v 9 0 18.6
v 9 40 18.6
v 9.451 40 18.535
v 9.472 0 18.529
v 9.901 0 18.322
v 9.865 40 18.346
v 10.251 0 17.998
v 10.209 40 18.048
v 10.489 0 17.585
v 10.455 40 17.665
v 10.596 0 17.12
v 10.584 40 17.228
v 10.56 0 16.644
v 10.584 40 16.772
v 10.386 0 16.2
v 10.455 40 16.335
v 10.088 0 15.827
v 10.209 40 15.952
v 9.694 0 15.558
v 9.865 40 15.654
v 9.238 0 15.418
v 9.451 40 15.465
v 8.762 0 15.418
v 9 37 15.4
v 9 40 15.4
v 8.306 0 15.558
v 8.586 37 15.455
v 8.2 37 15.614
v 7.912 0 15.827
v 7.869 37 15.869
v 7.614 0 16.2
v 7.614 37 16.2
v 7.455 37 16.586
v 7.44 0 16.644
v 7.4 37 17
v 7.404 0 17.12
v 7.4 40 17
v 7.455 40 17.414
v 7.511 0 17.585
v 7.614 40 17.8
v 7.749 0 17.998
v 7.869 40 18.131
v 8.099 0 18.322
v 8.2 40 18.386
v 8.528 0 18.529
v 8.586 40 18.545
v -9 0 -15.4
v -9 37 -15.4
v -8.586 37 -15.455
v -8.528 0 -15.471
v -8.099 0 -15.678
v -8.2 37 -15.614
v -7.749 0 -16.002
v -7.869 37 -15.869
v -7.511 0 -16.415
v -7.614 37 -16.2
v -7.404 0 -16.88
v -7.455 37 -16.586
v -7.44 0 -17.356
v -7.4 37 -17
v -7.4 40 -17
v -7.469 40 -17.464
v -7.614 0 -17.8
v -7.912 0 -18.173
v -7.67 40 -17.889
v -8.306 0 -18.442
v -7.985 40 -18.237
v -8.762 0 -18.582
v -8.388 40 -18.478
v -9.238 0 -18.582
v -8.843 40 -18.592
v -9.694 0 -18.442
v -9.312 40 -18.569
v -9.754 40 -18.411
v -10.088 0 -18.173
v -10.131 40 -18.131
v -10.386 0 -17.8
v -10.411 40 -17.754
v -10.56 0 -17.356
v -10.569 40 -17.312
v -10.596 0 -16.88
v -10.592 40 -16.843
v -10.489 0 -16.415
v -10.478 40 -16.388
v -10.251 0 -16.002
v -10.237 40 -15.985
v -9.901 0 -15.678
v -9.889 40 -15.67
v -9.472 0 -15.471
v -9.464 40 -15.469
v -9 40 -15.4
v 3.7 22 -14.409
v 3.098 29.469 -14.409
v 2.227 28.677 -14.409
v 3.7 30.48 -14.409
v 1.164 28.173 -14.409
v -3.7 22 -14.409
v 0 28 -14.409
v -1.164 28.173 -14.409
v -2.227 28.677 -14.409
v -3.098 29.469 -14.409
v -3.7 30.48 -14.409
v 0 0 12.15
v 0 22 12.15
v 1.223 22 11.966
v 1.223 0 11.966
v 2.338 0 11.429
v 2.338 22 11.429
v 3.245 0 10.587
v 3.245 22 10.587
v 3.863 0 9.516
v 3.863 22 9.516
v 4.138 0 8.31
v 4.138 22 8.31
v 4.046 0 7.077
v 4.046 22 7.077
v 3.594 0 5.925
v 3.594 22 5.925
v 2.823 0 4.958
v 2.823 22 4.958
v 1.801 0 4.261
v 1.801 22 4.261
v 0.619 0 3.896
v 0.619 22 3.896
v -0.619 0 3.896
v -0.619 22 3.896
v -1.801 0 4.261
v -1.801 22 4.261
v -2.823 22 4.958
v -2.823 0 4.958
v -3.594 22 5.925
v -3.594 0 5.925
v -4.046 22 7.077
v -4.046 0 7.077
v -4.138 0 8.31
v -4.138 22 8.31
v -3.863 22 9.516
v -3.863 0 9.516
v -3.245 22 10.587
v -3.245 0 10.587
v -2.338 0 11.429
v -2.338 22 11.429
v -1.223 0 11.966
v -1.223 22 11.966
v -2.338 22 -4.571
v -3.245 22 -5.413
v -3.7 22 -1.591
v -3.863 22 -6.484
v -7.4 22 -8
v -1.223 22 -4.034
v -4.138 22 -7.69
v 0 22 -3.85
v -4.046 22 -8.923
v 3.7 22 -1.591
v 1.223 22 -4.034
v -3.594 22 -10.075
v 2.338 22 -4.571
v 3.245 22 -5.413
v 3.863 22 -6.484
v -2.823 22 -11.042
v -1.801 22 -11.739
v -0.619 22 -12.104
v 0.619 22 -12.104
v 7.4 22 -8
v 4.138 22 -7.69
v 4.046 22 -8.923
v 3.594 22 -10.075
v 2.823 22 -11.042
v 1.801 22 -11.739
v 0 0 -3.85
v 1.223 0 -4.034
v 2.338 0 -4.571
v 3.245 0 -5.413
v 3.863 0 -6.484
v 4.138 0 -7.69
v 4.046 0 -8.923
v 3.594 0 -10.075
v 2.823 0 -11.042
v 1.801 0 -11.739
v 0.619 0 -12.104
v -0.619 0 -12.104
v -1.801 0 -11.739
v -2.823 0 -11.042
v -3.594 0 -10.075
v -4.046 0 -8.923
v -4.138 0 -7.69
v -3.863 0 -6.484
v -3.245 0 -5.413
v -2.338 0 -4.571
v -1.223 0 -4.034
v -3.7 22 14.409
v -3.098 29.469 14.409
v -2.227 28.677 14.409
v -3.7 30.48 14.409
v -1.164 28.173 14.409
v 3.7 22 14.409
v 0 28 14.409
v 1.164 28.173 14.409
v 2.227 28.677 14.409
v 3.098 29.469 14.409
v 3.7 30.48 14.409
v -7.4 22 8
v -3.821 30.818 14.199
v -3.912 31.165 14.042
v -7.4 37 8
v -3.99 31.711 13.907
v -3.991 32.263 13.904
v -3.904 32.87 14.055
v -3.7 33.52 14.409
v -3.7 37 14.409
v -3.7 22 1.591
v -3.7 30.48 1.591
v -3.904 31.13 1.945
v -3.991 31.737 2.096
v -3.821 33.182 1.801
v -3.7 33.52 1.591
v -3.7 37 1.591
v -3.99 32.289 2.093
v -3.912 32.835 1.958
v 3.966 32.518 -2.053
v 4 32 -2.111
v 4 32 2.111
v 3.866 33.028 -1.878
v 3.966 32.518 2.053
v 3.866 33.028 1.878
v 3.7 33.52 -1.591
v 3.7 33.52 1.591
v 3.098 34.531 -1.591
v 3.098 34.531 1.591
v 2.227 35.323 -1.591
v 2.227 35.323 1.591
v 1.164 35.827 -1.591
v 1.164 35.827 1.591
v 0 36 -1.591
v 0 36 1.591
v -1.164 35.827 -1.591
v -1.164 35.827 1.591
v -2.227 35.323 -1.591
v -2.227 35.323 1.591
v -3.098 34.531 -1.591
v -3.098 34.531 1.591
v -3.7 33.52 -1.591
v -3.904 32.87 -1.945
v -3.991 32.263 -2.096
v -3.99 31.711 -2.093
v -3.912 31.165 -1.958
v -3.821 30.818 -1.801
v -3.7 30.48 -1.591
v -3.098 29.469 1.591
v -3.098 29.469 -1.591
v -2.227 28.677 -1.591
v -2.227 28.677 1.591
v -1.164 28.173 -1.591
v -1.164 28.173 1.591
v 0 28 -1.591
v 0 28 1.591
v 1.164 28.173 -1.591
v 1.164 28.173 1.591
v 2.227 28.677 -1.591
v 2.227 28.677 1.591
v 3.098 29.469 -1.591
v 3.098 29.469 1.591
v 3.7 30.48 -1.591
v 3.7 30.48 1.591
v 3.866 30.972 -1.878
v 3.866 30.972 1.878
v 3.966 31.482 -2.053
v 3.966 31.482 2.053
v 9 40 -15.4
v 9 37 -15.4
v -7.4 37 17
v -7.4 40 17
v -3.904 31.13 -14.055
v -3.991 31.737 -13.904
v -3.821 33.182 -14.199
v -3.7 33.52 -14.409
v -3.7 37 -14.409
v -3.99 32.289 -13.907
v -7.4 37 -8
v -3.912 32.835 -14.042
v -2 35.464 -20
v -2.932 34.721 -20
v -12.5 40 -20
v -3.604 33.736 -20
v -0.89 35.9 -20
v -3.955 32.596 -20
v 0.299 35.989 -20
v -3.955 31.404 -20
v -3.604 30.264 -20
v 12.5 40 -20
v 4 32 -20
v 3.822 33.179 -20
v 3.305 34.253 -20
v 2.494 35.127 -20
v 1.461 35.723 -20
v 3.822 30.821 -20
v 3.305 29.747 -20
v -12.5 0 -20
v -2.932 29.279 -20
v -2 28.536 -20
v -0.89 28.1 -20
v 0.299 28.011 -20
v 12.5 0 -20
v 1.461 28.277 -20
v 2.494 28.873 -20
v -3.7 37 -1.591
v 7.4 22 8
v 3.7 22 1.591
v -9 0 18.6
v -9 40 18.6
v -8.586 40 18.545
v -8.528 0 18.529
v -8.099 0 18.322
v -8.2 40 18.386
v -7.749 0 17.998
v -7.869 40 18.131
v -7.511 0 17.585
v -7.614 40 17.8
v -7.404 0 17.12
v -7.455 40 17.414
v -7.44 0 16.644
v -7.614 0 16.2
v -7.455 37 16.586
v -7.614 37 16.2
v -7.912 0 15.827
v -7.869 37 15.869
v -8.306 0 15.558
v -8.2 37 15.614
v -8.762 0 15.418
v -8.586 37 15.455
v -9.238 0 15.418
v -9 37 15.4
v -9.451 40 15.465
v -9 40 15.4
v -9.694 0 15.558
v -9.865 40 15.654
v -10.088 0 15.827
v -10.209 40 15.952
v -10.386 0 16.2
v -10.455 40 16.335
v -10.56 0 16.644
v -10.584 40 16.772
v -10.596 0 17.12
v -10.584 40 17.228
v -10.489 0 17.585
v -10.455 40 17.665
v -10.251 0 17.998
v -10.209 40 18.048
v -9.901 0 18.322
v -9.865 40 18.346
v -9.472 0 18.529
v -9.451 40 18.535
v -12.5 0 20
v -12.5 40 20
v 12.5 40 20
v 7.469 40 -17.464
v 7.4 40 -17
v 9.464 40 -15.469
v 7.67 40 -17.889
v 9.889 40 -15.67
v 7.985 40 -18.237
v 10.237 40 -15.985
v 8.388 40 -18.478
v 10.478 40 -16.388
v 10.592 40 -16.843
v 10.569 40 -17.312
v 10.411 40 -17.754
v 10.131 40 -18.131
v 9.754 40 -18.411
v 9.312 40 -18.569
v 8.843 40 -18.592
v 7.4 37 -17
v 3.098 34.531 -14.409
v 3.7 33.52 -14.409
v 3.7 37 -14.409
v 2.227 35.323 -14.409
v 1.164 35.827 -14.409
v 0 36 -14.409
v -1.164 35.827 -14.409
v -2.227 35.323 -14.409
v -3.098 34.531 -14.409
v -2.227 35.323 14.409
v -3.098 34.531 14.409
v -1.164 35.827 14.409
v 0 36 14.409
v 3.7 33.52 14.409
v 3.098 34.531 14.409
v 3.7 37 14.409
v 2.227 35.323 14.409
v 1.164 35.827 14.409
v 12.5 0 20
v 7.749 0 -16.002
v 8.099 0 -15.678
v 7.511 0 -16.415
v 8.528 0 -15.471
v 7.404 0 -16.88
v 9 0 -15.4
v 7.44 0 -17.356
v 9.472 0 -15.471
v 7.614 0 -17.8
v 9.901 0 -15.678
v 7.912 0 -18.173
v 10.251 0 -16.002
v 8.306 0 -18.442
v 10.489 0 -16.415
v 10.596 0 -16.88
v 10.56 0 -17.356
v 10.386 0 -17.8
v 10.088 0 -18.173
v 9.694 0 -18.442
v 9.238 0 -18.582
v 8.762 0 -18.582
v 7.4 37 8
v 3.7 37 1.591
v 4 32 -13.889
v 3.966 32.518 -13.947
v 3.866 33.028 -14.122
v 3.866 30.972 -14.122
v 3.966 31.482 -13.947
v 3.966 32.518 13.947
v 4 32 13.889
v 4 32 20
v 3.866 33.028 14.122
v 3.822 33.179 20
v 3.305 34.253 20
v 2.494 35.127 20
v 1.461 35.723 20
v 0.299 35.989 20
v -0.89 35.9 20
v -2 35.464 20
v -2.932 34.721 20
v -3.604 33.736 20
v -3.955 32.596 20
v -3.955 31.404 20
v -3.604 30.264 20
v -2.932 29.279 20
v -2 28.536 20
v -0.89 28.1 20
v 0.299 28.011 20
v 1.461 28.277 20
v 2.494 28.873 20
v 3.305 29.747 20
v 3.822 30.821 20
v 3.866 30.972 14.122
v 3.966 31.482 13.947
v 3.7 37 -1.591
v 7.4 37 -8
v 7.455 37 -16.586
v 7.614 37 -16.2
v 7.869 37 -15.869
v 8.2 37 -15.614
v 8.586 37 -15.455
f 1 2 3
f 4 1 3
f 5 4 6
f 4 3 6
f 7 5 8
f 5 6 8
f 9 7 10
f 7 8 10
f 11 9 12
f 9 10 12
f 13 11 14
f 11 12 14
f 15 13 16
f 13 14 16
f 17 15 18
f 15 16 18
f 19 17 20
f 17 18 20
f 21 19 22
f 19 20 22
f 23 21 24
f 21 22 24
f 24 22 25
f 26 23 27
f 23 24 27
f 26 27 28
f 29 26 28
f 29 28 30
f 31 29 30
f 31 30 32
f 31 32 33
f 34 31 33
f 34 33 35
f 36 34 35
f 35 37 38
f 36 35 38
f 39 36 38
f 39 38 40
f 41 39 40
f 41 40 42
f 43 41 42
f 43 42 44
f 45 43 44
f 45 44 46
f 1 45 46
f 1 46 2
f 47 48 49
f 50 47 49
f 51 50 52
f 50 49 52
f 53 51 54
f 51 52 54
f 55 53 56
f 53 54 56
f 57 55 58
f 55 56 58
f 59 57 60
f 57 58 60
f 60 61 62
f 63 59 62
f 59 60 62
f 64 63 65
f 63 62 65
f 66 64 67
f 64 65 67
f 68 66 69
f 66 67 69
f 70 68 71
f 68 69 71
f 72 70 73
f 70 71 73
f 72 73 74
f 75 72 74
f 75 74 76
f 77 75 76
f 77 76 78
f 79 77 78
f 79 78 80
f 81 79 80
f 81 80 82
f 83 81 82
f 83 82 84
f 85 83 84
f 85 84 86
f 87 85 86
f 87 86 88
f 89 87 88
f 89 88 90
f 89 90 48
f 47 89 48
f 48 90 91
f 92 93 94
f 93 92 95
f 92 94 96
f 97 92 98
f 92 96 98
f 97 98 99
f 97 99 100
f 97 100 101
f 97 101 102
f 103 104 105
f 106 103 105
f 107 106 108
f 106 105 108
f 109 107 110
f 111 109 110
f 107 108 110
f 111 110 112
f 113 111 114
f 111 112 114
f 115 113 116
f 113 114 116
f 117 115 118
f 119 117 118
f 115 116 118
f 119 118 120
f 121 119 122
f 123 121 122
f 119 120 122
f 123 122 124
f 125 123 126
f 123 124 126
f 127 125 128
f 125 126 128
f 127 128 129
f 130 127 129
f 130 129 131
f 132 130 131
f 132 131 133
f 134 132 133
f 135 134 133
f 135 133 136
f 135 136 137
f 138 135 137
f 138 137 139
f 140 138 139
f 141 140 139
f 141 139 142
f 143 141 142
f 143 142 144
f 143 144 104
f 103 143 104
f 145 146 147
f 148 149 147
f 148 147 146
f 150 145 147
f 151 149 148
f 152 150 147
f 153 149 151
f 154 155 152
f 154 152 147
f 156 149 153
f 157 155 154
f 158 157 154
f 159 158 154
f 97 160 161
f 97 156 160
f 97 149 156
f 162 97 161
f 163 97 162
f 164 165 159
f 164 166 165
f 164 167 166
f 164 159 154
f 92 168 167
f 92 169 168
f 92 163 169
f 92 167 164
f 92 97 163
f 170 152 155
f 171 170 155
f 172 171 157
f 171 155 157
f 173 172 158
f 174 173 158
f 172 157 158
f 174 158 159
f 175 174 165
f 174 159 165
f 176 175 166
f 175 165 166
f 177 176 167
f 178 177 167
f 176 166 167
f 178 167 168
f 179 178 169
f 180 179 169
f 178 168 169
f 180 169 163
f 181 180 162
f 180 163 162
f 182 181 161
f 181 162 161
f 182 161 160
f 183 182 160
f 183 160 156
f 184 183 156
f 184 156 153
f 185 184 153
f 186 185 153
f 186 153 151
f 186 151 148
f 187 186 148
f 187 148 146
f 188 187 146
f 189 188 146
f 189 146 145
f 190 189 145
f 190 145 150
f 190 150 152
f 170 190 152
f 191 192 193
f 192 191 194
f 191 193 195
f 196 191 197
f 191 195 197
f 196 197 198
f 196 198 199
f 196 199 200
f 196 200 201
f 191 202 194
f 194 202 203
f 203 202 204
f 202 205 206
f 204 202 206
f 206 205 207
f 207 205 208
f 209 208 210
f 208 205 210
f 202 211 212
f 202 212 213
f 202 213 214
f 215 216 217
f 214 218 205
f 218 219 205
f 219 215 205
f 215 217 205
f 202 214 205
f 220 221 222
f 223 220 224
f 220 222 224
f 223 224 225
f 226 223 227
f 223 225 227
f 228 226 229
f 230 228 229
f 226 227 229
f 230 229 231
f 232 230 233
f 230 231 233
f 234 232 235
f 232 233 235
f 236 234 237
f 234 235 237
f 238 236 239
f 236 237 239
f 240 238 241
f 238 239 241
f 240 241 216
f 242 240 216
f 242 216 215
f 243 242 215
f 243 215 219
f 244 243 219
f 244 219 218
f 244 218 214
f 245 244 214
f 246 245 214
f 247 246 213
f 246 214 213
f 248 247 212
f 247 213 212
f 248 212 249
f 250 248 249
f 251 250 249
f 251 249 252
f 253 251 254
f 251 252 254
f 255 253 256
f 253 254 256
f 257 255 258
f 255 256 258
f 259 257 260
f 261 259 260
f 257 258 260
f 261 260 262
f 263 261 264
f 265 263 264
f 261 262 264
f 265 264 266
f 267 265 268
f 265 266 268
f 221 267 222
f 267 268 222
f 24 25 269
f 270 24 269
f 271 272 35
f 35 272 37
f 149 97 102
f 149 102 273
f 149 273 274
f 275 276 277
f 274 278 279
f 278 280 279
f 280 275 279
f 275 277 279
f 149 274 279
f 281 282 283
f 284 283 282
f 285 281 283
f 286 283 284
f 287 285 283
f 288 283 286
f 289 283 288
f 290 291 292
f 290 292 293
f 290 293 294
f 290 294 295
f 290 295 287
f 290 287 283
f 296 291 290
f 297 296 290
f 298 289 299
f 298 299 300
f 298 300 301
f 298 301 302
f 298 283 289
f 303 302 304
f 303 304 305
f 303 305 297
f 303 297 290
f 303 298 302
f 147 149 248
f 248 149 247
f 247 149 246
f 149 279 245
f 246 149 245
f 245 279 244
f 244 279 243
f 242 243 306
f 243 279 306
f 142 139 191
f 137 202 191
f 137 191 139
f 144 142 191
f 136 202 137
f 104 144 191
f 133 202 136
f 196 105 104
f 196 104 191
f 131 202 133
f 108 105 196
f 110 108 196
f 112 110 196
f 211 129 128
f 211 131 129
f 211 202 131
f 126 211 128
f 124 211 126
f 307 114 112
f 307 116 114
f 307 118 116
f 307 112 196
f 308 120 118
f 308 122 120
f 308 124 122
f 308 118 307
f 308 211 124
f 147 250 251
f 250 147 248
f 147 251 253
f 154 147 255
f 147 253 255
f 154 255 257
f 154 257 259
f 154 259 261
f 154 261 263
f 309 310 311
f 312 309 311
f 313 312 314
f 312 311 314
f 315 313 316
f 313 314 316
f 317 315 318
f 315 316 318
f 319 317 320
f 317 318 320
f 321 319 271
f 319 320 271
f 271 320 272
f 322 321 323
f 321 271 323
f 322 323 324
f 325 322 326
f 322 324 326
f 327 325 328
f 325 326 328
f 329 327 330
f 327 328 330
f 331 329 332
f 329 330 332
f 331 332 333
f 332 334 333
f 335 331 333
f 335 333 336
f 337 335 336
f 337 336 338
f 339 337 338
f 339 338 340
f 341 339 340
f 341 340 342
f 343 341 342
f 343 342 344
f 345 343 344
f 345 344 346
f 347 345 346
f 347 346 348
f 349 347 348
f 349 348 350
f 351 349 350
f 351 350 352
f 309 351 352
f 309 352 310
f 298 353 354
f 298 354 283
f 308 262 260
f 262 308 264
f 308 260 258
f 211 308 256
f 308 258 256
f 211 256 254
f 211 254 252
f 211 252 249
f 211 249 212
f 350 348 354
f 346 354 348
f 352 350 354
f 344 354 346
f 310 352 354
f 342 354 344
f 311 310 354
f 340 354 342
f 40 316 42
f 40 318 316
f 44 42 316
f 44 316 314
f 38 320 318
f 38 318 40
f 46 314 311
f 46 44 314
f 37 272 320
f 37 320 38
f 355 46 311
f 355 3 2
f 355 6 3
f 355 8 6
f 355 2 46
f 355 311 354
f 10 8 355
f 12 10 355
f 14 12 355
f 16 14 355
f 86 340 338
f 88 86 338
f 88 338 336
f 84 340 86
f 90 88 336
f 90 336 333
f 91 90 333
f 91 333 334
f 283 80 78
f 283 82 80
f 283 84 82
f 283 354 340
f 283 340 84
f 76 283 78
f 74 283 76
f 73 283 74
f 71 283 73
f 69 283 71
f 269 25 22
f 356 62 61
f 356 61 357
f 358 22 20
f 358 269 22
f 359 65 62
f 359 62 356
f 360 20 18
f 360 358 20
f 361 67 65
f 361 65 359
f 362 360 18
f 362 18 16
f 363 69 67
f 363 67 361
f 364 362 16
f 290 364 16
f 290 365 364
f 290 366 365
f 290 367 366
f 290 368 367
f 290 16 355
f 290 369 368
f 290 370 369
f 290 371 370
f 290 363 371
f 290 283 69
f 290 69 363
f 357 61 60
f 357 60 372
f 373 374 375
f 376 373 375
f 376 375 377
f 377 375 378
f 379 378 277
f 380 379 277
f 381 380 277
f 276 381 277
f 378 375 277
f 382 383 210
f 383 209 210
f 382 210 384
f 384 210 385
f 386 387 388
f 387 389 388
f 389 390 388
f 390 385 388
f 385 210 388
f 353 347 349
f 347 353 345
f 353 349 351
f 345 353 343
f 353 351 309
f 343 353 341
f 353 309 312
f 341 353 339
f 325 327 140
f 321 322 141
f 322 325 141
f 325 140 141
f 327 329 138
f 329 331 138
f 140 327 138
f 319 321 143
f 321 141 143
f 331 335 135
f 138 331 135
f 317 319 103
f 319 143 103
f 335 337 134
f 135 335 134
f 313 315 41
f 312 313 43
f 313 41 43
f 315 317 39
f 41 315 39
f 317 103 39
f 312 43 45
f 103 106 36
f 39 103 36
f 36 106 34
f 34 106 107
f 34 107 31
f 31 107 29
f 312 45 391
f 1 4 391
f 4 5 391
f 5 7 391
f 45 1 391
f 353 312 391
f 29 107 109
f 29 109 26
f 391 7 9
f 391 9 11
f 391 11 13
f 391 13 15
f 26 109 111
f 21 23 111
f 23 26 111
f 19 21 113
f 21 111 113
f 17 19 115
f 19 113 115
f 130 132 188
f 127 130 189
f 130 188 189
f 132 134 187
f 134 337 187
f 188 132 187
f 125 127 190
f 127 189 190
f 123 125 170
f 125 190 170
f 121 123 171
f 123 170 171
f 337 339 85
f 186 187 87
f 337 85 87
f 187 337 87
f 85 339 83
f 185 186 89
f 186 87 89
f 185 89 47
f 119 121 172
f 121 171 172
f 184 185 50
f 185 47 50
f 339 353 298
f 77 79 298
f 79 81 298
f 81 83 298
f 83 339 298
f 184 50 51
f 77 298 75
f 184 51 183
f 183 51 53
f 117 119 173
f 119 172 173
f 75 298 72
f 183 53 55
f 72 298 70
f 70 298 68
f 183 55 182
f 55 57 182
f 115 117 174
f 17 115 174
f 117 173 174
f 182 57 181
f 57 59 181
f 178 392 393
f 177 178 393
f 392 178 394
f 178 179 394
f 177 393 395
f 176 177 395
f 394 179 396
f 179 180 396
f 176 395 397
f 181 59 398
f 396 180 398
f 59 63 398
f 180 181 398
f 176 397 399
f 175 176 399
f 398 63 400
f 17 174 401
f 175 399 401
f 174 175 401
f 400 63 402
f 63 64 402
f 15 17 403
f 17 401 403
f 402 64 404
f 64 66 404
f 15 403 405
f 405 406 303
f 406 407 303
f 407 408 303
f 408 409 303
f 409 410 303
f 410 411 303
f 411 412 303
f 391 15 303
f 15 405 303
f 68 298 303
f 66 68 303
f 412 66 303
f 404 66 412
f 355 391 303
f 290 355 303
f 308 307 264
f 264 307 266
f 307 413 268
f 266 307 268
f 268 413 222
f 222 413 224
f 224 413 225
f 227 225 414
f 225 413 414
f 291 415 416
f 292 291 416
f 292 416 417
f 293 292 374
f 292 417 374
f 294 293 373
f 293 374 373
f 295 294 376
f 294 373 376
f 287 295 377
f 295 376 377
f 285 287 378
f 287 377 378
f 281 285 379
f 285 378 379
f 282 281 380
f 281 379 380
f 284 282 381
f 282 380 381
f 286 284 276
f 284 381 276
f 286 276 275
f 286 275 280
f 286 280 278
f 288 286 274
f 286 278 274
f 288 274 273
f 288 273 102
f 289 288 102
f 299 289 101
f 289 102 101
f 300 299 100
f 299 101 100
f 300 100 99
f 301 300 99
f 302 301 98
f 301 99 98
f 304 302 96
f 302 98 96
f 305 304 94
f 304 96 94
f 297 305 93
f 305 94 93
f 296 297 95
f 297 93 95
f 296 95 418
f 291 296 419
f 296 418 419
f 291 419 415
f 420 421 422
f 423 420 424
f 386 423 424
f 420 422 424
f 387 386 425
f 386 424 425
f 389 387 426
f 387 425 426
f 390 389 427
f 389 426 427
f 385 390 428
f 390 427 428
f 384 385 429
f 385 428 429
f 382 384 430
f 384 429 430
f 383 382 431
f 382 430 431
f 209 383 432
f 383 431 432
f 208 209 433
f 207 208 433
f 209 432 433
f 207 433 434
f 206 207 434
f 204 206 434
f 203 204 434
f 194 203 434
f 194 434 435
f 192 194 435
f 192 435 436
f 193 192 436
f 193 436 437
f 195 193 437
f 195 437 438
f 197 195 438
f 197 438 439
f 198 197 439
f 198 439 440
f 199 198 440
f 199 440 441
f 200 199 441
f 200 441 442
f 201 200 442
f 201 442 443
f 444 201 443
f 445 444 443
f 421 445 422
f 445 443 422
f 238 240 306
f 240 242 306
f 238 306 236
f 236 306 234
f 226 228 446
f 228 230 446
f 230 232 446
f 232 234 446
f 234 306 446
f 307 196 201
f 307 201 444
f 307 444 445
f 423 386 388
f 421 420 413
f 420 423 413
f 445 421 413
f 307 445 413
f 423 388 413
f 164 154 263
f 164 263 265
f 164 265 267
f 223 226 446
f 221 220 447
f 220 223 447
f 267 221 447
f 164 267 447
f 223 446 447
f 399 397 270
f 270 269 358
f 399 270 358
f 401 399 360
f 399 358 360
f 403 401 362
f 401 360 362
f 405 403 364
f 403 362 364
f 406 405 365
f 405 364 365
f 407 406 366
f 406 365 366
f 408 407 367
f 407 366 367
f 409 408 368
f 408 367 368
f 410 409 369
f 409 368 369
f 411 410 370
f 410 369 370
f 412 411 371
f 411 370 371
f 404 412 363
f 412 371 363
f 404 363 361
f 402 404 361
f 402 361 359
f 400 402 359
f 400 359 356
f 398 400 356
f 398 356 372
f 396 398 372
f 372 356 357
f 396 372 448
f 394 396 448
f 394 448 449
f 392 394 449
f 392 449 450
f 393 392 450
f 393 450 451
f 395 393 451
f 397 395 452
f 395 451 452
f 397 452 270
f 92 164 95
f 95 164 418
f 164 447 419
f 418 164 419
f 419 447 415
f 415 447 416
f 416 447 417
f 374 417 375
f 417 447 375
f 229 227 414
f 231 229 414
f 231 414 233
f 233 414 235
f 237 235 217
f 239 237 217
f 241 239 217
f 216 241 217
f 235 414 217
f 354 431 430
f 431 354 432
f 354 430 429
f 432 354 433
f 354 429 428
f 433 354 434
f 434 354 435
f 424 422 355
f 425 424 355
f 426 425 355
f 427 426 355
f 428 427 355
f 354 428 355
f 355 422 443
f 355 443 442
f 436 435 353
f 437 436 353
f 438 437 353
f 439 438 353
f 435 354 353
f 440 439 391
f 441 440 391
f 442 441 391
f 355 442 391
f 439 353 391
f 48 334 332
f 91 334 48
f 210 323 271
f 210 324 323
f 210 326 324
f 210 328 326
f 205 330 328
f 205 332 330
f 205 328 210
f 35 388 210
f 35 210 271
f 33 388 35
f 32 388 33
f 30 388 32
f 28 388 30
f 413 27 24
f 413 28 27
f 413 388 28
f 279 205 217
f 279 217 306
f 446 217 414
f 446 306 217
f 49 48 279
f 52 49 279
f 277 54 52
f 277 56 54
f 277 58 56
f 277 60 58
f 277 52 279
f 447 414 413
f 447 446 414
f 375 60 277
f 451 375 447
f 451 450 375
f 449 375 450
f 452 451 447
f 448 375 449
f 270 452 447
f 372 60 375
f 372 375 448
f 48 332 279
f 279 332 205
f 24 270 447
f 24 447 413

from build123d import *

# Parameters (mm, degrees)
SKETCH1_W           = 25
SKETCH1_H           = 40
BOSS_EXTRUDE1_DEPTH = 40
SKETCH2_R           = 4
CUT_EXTRUDE1_DEPTH  = 58.933151131
SKETCH4_R           = 4.15
CUT_EXTRUDE2_DEPTH  = 47.435439053
CUT_EXTRUDE3_DEPTH  = 18
SKETCH6_R           = 1.6
CUT_EXTRUDE4_DEPTH  = 47.435439053
SKETCH7_W           = 18
SKETCH7_H           = 34
CUT_EXTRUDE5_DEPTH  = 3


with BuildPart() as part:
    # Sketch1 → Boss-Extrude1 (new body)
    with BuildSketch(Plane(origin=(0, 0, 0), x_dir=(1, 0, 0), z_dir=(0, 1, 0))):
        Rectangle(SKETCH1_W, SKETCH1_H)
    extrude(amount=BOSS_EXTRUDE1_DEPTH)

    # Sketch2 → Cut-Extrude1 (cut, through all)
    with BuildSketch(Plane.XY.offset(20)):
        with Locations((0, 32)):
            Circle(SKETCH2_R)
    extrude(amount=-CUT_EXTRUDE1_DEPTH, mode=Mode.SUBTRACT)

    # Sketch4 → Cut-Extrude2 (cut, through all)
    with BuildSketch(Plane(origin=(0, 40, 0), x_dir=(1, 0, 0), z_dir=(0, 1, 0))):
        with Locations(Location((0, -8, 0), (0, 0, 270))):
            Circle(SKETCH4_R)
        with Locations(Location((0, 8, 0), (0, 0, 270))):
            Circle(SKETCH4_R)
    extrude(amount=-CUT_EXTRUDE2_DEPTH, mode=Mode.SUBTRACT)

    # Sketch5 → Cut-Extrude3 (cut)
    with BuildSketch(Plane(origin=(0, 40, 0), x_dir=(1, 0, 0), z_dir=(0, 1, 0))):
        Polygon((-3.7, -14.408587988), (3.7, -14.408587988), (7.4, -8), (3.7, -1.591412012), (-3.7, -1.591412012), (-7.4, -8), align=None)
        Polygon((-3.7, 14.408587988), (-7.4, 8), (-3.7, 1.591412012), (3.7, 1.591412012), (7.4, 8), (3.7, 14.408587988), align=None)
    extrude(amount=-CUT_EXTRUDE3_DEPTH, mode=Mode.SUBTRACT)

    # Sketch6 → Cut-Extrude4 (cut, through all)
    with BuildSketch(Plane(origin=(0, 40, 0), x_dir=(1, 0, 0), z_dir=(0, 1, 0))):
        with Locations(Location((9, -17, 0), (0, 0, 270))):
            Circle(SKETCH6_R)
        with Locations(Location((-9, -17, 0), (0, 0, 270))):
            Circle(SKETCH6_R)
        with Locations(Location((-9, 17, 0), (0, 0, 270))):
            Circle(SKETCH6_R)
        with Locations(Location((9, 17, 0), (0, 0, 270))):
            Circle(SKETCH6_R)
    extrude(amount=-CUT_EXTRUDE4_DEPTH, mode=Mode.SUBTRACT)

    # Sketch7 → Cut-Extrude5 (cut)
    with BuildSketch(Plane(origin=(0, 40, 0), x_dir=(1, 0, 0), z_dir=(0, 1, 0))):
        Rectangle(SKETCH7_W, SKETCH7_H)
    extrude(amount=-CUT_EXTRUDE5_DEPTH, mode=Mode.SUBTRACT)


solid = part.part
